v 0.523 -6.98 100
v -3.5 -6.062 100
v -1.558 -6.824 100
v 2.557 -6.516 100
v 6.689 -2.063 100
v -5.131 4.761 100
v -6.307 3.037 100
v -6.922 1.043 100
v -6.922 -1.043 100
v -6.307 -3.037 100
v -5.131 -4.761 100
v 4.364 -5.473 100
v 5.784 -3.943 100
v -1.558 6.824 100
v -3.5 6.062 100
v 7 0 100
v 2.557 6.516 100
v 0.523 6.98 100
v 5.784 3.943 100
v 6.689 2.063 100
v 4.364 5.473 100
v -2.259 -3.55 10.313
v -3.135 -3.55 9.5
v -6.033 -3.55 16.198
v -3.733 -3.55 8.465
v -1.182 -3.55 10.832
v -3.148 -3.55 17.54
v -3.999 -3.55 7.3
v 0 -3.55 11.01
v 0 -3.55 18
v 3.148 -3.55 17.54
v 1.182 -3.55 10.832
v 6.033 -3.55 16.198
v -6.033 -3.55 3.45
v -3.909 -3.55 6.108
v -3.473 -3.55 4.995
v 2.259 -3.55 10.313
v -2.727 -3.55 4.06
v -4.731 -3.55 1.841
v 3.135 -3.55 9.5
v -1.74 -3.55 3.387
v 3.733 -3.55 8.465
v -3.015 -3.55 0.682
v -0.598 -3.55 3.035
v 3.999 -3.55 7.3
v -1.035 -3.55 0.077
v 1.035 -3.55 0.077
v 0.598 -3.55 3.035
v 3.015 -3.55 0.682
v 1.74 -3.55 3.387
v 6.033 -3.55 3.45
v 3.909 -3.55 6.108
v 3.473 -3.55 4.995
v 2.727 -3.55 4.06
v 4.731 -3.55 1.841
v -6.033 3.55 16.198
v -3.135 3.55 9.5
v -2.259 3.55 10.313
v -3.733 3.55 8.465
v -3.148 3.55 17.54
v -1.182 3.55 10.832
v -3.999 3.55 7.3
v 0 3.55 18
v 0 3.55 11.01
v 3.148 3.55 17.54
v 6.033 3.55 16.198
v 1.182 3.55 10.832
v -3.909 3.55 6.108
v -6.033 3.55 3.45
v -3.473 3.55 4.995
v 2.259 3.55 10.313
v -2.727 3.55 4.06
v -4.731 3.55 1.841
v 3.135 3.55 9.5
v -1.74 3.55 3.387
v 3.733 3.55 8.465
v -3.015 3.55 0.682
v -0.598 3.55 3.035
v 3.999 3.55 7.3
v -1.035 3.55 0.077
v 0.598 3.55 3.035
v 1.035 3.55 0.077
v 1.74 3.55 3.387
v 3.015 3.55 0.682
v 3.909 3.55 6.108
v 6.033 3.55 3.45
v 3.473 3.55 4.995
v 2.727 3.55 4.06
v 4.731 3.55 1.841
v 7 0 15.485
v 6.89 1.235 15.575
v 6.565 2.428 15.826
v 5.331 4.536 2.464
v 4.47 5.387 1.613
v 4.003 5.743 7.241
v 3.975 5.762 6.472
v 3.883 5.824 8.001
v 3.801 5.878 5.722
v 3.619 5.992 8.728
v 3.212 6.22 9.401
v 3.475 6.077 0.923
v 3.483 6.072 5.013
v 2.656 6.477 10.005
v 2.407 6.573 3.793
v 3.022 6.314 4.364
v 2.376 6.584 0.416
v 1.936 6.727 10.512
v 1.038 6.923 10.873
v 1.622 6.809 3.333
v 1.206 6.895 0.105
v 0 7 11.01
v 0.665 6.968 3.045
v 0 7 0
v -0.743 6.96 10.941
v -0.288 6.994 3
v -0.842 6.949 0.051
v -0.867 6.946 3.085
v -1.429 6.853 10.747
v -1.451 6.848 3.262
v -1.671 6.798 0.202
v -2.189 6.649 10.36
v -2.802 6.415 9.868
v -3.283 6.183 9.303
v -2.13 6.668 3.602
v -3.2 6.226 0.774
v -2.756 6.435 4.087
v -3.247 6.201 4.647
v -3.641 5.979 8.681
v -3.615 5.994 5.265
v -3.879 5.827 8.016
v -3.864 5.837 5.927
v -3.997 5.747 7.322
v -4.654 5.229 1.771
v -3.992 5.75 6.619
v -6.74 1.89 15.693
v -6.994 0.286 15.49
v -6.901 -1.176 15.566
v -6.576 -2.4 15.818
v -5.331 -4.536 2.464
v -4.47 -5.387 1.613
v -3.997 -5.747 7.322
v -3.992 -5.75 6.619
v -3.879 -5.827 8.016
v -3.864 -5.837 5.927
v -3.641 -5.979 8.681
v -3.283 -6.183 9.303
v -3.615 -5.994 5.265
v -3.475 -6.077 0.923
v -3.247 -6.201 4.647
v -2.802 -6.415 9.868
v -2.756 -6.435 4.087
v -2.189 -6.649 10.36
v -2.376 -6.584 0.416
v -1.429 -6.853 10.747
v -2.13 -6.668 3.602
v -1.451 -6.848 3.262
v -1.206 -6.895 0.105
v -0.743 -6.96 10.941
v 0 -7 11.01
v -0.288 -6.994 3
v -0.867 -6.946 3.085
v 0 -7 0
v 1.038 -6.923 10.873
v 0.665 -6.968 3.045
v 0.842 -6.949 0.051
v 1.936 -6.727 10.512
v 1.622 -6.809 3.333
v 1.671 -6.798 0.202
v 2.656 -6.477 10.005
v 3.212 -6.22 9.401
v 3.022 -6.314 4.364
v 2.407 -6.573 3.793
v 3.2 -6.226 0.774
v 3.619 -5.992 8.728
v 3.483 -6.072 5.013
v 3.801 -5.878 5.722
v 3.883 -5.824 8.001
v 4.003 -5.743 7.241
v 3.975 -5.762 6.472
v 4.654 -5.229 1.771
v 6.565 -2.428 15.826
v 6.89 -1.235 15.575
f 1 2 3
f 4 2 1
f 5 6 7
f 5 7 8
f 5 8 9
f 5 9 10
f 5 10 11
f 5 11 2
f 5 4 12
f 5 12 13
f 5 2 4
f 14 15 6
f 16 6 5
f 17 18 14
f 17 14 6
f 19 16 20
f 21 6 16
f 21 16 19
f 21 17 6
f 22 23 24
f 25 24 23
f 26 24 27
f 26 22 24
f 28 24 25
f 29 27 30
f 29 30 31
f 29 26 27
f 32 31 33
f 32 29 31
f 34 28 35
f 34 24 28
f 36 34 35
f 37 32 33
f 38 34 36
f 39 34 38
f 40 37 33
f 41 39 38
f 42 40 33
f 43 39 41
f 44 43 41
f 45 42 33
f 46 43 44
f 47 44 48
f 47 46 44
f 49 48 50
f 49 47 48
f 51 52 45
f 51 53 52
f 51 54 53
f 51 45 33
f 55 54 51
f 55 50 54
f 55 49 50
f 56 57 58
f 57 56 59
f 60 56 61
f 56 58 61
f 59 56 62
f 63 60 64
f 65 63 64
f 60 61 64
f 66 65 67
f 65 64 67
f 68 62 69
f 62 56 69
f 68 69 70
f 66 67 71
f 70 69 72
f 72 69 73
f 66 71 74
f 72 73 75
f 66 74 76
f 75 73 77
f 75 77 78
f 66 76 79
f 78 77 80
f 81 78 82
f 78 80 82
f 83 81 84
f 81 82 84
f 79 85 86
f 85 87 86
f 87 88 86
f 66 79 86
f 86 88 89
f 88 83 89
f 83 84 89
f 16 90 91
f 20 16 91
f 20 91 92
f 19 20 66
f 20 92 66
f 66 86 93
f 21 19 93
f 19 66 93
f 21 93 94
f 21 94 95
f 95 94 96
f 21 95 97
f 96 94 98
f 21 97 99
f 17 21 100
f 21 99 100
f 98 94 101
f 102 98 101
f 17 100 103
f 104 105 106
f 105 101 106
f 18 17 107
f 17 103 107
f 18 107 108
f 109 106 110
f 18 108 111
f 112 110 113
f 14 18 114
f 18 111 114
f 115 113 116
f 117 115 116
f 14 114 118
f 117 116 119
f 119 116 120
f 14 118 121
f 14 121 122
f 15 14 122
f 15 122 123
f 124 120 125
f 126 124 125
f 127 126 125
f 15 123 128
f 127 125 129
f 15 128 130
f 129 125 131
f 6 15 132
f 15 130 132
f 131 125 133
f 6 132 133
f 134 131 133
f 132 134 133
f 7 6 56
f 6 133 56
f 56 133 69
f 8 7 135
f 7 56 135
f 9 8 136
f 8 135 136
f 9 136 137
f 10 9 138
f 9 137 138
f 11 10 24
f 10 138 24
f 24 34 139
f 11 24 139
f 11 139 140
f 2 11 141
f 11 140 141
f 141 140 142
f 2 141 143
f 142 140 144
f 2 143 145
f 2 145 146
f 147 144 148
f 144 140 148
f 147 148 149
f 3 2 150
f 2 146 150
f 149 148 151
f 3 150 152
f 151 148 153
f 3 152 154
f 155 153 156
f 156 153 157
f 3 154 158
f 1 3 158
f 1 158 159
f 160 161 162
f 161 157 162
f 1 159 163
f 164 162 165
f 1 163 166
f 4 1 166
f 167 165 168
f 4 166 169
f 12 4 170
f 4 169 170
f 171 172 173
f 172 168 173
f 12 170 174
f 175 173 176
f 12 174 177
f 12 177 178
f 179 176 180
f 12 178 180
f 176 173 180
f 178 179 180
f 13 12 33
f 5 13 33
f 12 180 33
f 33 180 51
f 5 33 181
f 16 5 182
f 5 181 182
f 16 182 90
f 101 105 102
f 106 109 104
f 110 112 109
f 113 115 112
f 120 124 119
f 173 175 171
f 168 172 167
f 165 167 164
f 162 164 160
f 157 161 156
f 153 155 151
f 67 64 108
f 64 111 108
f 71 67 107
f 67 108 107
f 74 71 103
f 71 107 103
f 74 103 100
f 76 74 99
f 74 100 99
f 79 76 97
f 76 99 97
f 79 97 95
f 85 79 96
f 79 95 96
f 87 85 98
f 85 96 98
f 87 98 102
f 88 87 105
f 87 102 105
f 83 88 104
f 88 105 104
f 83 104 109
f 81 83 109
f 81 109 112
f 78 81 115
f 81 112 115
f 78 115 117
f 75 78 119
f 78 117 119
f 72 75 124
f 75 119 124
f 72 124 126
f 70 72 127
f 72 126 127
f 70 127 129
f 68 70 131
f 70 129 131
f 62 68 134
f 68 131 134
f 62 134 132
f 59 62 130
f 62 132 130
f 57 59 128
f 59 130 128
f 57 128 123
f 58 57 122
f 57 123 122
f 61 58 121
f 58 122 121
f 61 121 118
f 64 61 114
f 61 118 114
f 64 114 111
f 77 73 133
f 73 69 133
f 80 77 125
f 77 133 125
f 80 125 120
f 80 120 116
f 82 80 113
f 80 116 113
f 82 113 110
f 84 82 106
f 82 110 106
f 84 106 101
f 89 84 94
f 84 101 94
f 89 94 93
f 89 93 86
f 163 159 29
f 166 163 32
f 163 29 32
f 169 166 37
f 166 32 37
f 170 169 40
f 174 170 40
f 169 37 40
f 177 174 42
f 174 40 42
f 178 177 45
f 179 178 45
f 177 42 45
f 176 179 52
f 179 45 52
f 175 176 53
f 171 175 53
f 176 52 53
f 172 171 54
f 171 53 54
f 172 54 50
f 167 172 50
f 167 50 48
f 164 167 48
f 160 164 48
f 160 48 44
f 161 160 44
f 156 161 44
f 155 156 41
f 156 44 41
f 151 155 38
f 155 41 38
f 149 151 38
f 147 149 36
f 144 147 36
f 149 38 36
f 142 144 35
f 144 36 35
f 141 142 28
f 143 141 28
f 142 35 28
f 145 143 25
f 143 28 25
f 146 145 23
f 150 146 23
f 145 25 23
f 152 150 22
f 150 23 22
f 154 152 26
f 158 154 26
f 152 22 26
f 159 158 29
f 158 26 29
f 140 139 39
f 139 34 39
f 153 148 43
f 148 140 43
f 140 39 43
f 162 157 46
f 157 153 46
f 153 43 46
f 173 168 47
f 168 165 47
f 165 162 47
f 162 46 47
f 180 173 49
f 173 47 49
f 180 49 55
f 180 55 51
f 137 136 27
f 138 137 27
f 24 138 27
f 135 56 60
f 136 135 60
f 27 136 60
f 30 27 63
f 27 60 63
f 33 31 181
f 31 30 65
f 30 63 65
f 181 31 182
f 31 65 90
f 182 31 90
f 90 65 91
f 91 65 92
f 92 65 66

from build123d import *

# Parameters (mm, degrees)
SKETCH_2_R          = 7
EXTRUDE_1_DEPTH     = 100
CUT_EXTRUDE_3_DEPTH = 8
SKETCH_6_R          = 11
CUT_EXTRUDE_5_DEPTH = 3.55
SKETCH_5_R          = 4.01
CUT_EXTRUDE_6_DEPTH = 80


with BuildPart() as part:
    # 草图2 → 凸台-拉伸1 (new body)
    with BuildSketch(Plane.XY):
        Circle(SKETCH_2_R)
    extrude(amount=EXTRUDE_1_DEPTH)

    # 草图3 → 切除-拉伸3 (cut, symmetric)
    with BuildSketch(Plane(origin=(0, 0, 0), x_dir=(1, 0, 0), z_dir=(0, 1, 0))):
        with BuildLine():
            ThreePointArc((-7, -7), (0, 0), (7, -7))
            Line((7, -7), (17.530133207, -7))
            ThreePointArc((17.530133207, -7), (0, 10.530133207), (-17.530133207, -7))
            Line((-17.530133207, -7), (-7, -7))
        make_face()
    extrude(amount=CUT_EXTRUDE_3_DEPTH, both=True, mode=Mode.SUBTRACT)

    # 草图6 → 切除-拉伸5 (cut, symmetric)
    with BuildSketch(Plane(origin=(0, 0, 0), x_dir=(1, 0, 0), z_dir=(0, 1, 0))):
        with Locations((0, -7)):
            Circle(SKETCH_6_R)
    extrude(amount=CUT_EXTRUDE_5_DEPTH, both=True, mode=Mode.SUBTRACT)

    # 草图5 → 切除-拉伸6 (cut, symmetric)
    with BuildSketch(Plane(origin=(0, 0, 0), x_dir=(1, 0, 0), z_dir=(0, 1, 0))):
        with Locations(Location((0, -7, 0), (0, 0, 270))):
            Circle(SKETCH_5_R)
    extrude(amount=CUT_EXTRUDE_6_DEPTH, both=True, mode=Mode.SUBTRACT)


solid = part.part
